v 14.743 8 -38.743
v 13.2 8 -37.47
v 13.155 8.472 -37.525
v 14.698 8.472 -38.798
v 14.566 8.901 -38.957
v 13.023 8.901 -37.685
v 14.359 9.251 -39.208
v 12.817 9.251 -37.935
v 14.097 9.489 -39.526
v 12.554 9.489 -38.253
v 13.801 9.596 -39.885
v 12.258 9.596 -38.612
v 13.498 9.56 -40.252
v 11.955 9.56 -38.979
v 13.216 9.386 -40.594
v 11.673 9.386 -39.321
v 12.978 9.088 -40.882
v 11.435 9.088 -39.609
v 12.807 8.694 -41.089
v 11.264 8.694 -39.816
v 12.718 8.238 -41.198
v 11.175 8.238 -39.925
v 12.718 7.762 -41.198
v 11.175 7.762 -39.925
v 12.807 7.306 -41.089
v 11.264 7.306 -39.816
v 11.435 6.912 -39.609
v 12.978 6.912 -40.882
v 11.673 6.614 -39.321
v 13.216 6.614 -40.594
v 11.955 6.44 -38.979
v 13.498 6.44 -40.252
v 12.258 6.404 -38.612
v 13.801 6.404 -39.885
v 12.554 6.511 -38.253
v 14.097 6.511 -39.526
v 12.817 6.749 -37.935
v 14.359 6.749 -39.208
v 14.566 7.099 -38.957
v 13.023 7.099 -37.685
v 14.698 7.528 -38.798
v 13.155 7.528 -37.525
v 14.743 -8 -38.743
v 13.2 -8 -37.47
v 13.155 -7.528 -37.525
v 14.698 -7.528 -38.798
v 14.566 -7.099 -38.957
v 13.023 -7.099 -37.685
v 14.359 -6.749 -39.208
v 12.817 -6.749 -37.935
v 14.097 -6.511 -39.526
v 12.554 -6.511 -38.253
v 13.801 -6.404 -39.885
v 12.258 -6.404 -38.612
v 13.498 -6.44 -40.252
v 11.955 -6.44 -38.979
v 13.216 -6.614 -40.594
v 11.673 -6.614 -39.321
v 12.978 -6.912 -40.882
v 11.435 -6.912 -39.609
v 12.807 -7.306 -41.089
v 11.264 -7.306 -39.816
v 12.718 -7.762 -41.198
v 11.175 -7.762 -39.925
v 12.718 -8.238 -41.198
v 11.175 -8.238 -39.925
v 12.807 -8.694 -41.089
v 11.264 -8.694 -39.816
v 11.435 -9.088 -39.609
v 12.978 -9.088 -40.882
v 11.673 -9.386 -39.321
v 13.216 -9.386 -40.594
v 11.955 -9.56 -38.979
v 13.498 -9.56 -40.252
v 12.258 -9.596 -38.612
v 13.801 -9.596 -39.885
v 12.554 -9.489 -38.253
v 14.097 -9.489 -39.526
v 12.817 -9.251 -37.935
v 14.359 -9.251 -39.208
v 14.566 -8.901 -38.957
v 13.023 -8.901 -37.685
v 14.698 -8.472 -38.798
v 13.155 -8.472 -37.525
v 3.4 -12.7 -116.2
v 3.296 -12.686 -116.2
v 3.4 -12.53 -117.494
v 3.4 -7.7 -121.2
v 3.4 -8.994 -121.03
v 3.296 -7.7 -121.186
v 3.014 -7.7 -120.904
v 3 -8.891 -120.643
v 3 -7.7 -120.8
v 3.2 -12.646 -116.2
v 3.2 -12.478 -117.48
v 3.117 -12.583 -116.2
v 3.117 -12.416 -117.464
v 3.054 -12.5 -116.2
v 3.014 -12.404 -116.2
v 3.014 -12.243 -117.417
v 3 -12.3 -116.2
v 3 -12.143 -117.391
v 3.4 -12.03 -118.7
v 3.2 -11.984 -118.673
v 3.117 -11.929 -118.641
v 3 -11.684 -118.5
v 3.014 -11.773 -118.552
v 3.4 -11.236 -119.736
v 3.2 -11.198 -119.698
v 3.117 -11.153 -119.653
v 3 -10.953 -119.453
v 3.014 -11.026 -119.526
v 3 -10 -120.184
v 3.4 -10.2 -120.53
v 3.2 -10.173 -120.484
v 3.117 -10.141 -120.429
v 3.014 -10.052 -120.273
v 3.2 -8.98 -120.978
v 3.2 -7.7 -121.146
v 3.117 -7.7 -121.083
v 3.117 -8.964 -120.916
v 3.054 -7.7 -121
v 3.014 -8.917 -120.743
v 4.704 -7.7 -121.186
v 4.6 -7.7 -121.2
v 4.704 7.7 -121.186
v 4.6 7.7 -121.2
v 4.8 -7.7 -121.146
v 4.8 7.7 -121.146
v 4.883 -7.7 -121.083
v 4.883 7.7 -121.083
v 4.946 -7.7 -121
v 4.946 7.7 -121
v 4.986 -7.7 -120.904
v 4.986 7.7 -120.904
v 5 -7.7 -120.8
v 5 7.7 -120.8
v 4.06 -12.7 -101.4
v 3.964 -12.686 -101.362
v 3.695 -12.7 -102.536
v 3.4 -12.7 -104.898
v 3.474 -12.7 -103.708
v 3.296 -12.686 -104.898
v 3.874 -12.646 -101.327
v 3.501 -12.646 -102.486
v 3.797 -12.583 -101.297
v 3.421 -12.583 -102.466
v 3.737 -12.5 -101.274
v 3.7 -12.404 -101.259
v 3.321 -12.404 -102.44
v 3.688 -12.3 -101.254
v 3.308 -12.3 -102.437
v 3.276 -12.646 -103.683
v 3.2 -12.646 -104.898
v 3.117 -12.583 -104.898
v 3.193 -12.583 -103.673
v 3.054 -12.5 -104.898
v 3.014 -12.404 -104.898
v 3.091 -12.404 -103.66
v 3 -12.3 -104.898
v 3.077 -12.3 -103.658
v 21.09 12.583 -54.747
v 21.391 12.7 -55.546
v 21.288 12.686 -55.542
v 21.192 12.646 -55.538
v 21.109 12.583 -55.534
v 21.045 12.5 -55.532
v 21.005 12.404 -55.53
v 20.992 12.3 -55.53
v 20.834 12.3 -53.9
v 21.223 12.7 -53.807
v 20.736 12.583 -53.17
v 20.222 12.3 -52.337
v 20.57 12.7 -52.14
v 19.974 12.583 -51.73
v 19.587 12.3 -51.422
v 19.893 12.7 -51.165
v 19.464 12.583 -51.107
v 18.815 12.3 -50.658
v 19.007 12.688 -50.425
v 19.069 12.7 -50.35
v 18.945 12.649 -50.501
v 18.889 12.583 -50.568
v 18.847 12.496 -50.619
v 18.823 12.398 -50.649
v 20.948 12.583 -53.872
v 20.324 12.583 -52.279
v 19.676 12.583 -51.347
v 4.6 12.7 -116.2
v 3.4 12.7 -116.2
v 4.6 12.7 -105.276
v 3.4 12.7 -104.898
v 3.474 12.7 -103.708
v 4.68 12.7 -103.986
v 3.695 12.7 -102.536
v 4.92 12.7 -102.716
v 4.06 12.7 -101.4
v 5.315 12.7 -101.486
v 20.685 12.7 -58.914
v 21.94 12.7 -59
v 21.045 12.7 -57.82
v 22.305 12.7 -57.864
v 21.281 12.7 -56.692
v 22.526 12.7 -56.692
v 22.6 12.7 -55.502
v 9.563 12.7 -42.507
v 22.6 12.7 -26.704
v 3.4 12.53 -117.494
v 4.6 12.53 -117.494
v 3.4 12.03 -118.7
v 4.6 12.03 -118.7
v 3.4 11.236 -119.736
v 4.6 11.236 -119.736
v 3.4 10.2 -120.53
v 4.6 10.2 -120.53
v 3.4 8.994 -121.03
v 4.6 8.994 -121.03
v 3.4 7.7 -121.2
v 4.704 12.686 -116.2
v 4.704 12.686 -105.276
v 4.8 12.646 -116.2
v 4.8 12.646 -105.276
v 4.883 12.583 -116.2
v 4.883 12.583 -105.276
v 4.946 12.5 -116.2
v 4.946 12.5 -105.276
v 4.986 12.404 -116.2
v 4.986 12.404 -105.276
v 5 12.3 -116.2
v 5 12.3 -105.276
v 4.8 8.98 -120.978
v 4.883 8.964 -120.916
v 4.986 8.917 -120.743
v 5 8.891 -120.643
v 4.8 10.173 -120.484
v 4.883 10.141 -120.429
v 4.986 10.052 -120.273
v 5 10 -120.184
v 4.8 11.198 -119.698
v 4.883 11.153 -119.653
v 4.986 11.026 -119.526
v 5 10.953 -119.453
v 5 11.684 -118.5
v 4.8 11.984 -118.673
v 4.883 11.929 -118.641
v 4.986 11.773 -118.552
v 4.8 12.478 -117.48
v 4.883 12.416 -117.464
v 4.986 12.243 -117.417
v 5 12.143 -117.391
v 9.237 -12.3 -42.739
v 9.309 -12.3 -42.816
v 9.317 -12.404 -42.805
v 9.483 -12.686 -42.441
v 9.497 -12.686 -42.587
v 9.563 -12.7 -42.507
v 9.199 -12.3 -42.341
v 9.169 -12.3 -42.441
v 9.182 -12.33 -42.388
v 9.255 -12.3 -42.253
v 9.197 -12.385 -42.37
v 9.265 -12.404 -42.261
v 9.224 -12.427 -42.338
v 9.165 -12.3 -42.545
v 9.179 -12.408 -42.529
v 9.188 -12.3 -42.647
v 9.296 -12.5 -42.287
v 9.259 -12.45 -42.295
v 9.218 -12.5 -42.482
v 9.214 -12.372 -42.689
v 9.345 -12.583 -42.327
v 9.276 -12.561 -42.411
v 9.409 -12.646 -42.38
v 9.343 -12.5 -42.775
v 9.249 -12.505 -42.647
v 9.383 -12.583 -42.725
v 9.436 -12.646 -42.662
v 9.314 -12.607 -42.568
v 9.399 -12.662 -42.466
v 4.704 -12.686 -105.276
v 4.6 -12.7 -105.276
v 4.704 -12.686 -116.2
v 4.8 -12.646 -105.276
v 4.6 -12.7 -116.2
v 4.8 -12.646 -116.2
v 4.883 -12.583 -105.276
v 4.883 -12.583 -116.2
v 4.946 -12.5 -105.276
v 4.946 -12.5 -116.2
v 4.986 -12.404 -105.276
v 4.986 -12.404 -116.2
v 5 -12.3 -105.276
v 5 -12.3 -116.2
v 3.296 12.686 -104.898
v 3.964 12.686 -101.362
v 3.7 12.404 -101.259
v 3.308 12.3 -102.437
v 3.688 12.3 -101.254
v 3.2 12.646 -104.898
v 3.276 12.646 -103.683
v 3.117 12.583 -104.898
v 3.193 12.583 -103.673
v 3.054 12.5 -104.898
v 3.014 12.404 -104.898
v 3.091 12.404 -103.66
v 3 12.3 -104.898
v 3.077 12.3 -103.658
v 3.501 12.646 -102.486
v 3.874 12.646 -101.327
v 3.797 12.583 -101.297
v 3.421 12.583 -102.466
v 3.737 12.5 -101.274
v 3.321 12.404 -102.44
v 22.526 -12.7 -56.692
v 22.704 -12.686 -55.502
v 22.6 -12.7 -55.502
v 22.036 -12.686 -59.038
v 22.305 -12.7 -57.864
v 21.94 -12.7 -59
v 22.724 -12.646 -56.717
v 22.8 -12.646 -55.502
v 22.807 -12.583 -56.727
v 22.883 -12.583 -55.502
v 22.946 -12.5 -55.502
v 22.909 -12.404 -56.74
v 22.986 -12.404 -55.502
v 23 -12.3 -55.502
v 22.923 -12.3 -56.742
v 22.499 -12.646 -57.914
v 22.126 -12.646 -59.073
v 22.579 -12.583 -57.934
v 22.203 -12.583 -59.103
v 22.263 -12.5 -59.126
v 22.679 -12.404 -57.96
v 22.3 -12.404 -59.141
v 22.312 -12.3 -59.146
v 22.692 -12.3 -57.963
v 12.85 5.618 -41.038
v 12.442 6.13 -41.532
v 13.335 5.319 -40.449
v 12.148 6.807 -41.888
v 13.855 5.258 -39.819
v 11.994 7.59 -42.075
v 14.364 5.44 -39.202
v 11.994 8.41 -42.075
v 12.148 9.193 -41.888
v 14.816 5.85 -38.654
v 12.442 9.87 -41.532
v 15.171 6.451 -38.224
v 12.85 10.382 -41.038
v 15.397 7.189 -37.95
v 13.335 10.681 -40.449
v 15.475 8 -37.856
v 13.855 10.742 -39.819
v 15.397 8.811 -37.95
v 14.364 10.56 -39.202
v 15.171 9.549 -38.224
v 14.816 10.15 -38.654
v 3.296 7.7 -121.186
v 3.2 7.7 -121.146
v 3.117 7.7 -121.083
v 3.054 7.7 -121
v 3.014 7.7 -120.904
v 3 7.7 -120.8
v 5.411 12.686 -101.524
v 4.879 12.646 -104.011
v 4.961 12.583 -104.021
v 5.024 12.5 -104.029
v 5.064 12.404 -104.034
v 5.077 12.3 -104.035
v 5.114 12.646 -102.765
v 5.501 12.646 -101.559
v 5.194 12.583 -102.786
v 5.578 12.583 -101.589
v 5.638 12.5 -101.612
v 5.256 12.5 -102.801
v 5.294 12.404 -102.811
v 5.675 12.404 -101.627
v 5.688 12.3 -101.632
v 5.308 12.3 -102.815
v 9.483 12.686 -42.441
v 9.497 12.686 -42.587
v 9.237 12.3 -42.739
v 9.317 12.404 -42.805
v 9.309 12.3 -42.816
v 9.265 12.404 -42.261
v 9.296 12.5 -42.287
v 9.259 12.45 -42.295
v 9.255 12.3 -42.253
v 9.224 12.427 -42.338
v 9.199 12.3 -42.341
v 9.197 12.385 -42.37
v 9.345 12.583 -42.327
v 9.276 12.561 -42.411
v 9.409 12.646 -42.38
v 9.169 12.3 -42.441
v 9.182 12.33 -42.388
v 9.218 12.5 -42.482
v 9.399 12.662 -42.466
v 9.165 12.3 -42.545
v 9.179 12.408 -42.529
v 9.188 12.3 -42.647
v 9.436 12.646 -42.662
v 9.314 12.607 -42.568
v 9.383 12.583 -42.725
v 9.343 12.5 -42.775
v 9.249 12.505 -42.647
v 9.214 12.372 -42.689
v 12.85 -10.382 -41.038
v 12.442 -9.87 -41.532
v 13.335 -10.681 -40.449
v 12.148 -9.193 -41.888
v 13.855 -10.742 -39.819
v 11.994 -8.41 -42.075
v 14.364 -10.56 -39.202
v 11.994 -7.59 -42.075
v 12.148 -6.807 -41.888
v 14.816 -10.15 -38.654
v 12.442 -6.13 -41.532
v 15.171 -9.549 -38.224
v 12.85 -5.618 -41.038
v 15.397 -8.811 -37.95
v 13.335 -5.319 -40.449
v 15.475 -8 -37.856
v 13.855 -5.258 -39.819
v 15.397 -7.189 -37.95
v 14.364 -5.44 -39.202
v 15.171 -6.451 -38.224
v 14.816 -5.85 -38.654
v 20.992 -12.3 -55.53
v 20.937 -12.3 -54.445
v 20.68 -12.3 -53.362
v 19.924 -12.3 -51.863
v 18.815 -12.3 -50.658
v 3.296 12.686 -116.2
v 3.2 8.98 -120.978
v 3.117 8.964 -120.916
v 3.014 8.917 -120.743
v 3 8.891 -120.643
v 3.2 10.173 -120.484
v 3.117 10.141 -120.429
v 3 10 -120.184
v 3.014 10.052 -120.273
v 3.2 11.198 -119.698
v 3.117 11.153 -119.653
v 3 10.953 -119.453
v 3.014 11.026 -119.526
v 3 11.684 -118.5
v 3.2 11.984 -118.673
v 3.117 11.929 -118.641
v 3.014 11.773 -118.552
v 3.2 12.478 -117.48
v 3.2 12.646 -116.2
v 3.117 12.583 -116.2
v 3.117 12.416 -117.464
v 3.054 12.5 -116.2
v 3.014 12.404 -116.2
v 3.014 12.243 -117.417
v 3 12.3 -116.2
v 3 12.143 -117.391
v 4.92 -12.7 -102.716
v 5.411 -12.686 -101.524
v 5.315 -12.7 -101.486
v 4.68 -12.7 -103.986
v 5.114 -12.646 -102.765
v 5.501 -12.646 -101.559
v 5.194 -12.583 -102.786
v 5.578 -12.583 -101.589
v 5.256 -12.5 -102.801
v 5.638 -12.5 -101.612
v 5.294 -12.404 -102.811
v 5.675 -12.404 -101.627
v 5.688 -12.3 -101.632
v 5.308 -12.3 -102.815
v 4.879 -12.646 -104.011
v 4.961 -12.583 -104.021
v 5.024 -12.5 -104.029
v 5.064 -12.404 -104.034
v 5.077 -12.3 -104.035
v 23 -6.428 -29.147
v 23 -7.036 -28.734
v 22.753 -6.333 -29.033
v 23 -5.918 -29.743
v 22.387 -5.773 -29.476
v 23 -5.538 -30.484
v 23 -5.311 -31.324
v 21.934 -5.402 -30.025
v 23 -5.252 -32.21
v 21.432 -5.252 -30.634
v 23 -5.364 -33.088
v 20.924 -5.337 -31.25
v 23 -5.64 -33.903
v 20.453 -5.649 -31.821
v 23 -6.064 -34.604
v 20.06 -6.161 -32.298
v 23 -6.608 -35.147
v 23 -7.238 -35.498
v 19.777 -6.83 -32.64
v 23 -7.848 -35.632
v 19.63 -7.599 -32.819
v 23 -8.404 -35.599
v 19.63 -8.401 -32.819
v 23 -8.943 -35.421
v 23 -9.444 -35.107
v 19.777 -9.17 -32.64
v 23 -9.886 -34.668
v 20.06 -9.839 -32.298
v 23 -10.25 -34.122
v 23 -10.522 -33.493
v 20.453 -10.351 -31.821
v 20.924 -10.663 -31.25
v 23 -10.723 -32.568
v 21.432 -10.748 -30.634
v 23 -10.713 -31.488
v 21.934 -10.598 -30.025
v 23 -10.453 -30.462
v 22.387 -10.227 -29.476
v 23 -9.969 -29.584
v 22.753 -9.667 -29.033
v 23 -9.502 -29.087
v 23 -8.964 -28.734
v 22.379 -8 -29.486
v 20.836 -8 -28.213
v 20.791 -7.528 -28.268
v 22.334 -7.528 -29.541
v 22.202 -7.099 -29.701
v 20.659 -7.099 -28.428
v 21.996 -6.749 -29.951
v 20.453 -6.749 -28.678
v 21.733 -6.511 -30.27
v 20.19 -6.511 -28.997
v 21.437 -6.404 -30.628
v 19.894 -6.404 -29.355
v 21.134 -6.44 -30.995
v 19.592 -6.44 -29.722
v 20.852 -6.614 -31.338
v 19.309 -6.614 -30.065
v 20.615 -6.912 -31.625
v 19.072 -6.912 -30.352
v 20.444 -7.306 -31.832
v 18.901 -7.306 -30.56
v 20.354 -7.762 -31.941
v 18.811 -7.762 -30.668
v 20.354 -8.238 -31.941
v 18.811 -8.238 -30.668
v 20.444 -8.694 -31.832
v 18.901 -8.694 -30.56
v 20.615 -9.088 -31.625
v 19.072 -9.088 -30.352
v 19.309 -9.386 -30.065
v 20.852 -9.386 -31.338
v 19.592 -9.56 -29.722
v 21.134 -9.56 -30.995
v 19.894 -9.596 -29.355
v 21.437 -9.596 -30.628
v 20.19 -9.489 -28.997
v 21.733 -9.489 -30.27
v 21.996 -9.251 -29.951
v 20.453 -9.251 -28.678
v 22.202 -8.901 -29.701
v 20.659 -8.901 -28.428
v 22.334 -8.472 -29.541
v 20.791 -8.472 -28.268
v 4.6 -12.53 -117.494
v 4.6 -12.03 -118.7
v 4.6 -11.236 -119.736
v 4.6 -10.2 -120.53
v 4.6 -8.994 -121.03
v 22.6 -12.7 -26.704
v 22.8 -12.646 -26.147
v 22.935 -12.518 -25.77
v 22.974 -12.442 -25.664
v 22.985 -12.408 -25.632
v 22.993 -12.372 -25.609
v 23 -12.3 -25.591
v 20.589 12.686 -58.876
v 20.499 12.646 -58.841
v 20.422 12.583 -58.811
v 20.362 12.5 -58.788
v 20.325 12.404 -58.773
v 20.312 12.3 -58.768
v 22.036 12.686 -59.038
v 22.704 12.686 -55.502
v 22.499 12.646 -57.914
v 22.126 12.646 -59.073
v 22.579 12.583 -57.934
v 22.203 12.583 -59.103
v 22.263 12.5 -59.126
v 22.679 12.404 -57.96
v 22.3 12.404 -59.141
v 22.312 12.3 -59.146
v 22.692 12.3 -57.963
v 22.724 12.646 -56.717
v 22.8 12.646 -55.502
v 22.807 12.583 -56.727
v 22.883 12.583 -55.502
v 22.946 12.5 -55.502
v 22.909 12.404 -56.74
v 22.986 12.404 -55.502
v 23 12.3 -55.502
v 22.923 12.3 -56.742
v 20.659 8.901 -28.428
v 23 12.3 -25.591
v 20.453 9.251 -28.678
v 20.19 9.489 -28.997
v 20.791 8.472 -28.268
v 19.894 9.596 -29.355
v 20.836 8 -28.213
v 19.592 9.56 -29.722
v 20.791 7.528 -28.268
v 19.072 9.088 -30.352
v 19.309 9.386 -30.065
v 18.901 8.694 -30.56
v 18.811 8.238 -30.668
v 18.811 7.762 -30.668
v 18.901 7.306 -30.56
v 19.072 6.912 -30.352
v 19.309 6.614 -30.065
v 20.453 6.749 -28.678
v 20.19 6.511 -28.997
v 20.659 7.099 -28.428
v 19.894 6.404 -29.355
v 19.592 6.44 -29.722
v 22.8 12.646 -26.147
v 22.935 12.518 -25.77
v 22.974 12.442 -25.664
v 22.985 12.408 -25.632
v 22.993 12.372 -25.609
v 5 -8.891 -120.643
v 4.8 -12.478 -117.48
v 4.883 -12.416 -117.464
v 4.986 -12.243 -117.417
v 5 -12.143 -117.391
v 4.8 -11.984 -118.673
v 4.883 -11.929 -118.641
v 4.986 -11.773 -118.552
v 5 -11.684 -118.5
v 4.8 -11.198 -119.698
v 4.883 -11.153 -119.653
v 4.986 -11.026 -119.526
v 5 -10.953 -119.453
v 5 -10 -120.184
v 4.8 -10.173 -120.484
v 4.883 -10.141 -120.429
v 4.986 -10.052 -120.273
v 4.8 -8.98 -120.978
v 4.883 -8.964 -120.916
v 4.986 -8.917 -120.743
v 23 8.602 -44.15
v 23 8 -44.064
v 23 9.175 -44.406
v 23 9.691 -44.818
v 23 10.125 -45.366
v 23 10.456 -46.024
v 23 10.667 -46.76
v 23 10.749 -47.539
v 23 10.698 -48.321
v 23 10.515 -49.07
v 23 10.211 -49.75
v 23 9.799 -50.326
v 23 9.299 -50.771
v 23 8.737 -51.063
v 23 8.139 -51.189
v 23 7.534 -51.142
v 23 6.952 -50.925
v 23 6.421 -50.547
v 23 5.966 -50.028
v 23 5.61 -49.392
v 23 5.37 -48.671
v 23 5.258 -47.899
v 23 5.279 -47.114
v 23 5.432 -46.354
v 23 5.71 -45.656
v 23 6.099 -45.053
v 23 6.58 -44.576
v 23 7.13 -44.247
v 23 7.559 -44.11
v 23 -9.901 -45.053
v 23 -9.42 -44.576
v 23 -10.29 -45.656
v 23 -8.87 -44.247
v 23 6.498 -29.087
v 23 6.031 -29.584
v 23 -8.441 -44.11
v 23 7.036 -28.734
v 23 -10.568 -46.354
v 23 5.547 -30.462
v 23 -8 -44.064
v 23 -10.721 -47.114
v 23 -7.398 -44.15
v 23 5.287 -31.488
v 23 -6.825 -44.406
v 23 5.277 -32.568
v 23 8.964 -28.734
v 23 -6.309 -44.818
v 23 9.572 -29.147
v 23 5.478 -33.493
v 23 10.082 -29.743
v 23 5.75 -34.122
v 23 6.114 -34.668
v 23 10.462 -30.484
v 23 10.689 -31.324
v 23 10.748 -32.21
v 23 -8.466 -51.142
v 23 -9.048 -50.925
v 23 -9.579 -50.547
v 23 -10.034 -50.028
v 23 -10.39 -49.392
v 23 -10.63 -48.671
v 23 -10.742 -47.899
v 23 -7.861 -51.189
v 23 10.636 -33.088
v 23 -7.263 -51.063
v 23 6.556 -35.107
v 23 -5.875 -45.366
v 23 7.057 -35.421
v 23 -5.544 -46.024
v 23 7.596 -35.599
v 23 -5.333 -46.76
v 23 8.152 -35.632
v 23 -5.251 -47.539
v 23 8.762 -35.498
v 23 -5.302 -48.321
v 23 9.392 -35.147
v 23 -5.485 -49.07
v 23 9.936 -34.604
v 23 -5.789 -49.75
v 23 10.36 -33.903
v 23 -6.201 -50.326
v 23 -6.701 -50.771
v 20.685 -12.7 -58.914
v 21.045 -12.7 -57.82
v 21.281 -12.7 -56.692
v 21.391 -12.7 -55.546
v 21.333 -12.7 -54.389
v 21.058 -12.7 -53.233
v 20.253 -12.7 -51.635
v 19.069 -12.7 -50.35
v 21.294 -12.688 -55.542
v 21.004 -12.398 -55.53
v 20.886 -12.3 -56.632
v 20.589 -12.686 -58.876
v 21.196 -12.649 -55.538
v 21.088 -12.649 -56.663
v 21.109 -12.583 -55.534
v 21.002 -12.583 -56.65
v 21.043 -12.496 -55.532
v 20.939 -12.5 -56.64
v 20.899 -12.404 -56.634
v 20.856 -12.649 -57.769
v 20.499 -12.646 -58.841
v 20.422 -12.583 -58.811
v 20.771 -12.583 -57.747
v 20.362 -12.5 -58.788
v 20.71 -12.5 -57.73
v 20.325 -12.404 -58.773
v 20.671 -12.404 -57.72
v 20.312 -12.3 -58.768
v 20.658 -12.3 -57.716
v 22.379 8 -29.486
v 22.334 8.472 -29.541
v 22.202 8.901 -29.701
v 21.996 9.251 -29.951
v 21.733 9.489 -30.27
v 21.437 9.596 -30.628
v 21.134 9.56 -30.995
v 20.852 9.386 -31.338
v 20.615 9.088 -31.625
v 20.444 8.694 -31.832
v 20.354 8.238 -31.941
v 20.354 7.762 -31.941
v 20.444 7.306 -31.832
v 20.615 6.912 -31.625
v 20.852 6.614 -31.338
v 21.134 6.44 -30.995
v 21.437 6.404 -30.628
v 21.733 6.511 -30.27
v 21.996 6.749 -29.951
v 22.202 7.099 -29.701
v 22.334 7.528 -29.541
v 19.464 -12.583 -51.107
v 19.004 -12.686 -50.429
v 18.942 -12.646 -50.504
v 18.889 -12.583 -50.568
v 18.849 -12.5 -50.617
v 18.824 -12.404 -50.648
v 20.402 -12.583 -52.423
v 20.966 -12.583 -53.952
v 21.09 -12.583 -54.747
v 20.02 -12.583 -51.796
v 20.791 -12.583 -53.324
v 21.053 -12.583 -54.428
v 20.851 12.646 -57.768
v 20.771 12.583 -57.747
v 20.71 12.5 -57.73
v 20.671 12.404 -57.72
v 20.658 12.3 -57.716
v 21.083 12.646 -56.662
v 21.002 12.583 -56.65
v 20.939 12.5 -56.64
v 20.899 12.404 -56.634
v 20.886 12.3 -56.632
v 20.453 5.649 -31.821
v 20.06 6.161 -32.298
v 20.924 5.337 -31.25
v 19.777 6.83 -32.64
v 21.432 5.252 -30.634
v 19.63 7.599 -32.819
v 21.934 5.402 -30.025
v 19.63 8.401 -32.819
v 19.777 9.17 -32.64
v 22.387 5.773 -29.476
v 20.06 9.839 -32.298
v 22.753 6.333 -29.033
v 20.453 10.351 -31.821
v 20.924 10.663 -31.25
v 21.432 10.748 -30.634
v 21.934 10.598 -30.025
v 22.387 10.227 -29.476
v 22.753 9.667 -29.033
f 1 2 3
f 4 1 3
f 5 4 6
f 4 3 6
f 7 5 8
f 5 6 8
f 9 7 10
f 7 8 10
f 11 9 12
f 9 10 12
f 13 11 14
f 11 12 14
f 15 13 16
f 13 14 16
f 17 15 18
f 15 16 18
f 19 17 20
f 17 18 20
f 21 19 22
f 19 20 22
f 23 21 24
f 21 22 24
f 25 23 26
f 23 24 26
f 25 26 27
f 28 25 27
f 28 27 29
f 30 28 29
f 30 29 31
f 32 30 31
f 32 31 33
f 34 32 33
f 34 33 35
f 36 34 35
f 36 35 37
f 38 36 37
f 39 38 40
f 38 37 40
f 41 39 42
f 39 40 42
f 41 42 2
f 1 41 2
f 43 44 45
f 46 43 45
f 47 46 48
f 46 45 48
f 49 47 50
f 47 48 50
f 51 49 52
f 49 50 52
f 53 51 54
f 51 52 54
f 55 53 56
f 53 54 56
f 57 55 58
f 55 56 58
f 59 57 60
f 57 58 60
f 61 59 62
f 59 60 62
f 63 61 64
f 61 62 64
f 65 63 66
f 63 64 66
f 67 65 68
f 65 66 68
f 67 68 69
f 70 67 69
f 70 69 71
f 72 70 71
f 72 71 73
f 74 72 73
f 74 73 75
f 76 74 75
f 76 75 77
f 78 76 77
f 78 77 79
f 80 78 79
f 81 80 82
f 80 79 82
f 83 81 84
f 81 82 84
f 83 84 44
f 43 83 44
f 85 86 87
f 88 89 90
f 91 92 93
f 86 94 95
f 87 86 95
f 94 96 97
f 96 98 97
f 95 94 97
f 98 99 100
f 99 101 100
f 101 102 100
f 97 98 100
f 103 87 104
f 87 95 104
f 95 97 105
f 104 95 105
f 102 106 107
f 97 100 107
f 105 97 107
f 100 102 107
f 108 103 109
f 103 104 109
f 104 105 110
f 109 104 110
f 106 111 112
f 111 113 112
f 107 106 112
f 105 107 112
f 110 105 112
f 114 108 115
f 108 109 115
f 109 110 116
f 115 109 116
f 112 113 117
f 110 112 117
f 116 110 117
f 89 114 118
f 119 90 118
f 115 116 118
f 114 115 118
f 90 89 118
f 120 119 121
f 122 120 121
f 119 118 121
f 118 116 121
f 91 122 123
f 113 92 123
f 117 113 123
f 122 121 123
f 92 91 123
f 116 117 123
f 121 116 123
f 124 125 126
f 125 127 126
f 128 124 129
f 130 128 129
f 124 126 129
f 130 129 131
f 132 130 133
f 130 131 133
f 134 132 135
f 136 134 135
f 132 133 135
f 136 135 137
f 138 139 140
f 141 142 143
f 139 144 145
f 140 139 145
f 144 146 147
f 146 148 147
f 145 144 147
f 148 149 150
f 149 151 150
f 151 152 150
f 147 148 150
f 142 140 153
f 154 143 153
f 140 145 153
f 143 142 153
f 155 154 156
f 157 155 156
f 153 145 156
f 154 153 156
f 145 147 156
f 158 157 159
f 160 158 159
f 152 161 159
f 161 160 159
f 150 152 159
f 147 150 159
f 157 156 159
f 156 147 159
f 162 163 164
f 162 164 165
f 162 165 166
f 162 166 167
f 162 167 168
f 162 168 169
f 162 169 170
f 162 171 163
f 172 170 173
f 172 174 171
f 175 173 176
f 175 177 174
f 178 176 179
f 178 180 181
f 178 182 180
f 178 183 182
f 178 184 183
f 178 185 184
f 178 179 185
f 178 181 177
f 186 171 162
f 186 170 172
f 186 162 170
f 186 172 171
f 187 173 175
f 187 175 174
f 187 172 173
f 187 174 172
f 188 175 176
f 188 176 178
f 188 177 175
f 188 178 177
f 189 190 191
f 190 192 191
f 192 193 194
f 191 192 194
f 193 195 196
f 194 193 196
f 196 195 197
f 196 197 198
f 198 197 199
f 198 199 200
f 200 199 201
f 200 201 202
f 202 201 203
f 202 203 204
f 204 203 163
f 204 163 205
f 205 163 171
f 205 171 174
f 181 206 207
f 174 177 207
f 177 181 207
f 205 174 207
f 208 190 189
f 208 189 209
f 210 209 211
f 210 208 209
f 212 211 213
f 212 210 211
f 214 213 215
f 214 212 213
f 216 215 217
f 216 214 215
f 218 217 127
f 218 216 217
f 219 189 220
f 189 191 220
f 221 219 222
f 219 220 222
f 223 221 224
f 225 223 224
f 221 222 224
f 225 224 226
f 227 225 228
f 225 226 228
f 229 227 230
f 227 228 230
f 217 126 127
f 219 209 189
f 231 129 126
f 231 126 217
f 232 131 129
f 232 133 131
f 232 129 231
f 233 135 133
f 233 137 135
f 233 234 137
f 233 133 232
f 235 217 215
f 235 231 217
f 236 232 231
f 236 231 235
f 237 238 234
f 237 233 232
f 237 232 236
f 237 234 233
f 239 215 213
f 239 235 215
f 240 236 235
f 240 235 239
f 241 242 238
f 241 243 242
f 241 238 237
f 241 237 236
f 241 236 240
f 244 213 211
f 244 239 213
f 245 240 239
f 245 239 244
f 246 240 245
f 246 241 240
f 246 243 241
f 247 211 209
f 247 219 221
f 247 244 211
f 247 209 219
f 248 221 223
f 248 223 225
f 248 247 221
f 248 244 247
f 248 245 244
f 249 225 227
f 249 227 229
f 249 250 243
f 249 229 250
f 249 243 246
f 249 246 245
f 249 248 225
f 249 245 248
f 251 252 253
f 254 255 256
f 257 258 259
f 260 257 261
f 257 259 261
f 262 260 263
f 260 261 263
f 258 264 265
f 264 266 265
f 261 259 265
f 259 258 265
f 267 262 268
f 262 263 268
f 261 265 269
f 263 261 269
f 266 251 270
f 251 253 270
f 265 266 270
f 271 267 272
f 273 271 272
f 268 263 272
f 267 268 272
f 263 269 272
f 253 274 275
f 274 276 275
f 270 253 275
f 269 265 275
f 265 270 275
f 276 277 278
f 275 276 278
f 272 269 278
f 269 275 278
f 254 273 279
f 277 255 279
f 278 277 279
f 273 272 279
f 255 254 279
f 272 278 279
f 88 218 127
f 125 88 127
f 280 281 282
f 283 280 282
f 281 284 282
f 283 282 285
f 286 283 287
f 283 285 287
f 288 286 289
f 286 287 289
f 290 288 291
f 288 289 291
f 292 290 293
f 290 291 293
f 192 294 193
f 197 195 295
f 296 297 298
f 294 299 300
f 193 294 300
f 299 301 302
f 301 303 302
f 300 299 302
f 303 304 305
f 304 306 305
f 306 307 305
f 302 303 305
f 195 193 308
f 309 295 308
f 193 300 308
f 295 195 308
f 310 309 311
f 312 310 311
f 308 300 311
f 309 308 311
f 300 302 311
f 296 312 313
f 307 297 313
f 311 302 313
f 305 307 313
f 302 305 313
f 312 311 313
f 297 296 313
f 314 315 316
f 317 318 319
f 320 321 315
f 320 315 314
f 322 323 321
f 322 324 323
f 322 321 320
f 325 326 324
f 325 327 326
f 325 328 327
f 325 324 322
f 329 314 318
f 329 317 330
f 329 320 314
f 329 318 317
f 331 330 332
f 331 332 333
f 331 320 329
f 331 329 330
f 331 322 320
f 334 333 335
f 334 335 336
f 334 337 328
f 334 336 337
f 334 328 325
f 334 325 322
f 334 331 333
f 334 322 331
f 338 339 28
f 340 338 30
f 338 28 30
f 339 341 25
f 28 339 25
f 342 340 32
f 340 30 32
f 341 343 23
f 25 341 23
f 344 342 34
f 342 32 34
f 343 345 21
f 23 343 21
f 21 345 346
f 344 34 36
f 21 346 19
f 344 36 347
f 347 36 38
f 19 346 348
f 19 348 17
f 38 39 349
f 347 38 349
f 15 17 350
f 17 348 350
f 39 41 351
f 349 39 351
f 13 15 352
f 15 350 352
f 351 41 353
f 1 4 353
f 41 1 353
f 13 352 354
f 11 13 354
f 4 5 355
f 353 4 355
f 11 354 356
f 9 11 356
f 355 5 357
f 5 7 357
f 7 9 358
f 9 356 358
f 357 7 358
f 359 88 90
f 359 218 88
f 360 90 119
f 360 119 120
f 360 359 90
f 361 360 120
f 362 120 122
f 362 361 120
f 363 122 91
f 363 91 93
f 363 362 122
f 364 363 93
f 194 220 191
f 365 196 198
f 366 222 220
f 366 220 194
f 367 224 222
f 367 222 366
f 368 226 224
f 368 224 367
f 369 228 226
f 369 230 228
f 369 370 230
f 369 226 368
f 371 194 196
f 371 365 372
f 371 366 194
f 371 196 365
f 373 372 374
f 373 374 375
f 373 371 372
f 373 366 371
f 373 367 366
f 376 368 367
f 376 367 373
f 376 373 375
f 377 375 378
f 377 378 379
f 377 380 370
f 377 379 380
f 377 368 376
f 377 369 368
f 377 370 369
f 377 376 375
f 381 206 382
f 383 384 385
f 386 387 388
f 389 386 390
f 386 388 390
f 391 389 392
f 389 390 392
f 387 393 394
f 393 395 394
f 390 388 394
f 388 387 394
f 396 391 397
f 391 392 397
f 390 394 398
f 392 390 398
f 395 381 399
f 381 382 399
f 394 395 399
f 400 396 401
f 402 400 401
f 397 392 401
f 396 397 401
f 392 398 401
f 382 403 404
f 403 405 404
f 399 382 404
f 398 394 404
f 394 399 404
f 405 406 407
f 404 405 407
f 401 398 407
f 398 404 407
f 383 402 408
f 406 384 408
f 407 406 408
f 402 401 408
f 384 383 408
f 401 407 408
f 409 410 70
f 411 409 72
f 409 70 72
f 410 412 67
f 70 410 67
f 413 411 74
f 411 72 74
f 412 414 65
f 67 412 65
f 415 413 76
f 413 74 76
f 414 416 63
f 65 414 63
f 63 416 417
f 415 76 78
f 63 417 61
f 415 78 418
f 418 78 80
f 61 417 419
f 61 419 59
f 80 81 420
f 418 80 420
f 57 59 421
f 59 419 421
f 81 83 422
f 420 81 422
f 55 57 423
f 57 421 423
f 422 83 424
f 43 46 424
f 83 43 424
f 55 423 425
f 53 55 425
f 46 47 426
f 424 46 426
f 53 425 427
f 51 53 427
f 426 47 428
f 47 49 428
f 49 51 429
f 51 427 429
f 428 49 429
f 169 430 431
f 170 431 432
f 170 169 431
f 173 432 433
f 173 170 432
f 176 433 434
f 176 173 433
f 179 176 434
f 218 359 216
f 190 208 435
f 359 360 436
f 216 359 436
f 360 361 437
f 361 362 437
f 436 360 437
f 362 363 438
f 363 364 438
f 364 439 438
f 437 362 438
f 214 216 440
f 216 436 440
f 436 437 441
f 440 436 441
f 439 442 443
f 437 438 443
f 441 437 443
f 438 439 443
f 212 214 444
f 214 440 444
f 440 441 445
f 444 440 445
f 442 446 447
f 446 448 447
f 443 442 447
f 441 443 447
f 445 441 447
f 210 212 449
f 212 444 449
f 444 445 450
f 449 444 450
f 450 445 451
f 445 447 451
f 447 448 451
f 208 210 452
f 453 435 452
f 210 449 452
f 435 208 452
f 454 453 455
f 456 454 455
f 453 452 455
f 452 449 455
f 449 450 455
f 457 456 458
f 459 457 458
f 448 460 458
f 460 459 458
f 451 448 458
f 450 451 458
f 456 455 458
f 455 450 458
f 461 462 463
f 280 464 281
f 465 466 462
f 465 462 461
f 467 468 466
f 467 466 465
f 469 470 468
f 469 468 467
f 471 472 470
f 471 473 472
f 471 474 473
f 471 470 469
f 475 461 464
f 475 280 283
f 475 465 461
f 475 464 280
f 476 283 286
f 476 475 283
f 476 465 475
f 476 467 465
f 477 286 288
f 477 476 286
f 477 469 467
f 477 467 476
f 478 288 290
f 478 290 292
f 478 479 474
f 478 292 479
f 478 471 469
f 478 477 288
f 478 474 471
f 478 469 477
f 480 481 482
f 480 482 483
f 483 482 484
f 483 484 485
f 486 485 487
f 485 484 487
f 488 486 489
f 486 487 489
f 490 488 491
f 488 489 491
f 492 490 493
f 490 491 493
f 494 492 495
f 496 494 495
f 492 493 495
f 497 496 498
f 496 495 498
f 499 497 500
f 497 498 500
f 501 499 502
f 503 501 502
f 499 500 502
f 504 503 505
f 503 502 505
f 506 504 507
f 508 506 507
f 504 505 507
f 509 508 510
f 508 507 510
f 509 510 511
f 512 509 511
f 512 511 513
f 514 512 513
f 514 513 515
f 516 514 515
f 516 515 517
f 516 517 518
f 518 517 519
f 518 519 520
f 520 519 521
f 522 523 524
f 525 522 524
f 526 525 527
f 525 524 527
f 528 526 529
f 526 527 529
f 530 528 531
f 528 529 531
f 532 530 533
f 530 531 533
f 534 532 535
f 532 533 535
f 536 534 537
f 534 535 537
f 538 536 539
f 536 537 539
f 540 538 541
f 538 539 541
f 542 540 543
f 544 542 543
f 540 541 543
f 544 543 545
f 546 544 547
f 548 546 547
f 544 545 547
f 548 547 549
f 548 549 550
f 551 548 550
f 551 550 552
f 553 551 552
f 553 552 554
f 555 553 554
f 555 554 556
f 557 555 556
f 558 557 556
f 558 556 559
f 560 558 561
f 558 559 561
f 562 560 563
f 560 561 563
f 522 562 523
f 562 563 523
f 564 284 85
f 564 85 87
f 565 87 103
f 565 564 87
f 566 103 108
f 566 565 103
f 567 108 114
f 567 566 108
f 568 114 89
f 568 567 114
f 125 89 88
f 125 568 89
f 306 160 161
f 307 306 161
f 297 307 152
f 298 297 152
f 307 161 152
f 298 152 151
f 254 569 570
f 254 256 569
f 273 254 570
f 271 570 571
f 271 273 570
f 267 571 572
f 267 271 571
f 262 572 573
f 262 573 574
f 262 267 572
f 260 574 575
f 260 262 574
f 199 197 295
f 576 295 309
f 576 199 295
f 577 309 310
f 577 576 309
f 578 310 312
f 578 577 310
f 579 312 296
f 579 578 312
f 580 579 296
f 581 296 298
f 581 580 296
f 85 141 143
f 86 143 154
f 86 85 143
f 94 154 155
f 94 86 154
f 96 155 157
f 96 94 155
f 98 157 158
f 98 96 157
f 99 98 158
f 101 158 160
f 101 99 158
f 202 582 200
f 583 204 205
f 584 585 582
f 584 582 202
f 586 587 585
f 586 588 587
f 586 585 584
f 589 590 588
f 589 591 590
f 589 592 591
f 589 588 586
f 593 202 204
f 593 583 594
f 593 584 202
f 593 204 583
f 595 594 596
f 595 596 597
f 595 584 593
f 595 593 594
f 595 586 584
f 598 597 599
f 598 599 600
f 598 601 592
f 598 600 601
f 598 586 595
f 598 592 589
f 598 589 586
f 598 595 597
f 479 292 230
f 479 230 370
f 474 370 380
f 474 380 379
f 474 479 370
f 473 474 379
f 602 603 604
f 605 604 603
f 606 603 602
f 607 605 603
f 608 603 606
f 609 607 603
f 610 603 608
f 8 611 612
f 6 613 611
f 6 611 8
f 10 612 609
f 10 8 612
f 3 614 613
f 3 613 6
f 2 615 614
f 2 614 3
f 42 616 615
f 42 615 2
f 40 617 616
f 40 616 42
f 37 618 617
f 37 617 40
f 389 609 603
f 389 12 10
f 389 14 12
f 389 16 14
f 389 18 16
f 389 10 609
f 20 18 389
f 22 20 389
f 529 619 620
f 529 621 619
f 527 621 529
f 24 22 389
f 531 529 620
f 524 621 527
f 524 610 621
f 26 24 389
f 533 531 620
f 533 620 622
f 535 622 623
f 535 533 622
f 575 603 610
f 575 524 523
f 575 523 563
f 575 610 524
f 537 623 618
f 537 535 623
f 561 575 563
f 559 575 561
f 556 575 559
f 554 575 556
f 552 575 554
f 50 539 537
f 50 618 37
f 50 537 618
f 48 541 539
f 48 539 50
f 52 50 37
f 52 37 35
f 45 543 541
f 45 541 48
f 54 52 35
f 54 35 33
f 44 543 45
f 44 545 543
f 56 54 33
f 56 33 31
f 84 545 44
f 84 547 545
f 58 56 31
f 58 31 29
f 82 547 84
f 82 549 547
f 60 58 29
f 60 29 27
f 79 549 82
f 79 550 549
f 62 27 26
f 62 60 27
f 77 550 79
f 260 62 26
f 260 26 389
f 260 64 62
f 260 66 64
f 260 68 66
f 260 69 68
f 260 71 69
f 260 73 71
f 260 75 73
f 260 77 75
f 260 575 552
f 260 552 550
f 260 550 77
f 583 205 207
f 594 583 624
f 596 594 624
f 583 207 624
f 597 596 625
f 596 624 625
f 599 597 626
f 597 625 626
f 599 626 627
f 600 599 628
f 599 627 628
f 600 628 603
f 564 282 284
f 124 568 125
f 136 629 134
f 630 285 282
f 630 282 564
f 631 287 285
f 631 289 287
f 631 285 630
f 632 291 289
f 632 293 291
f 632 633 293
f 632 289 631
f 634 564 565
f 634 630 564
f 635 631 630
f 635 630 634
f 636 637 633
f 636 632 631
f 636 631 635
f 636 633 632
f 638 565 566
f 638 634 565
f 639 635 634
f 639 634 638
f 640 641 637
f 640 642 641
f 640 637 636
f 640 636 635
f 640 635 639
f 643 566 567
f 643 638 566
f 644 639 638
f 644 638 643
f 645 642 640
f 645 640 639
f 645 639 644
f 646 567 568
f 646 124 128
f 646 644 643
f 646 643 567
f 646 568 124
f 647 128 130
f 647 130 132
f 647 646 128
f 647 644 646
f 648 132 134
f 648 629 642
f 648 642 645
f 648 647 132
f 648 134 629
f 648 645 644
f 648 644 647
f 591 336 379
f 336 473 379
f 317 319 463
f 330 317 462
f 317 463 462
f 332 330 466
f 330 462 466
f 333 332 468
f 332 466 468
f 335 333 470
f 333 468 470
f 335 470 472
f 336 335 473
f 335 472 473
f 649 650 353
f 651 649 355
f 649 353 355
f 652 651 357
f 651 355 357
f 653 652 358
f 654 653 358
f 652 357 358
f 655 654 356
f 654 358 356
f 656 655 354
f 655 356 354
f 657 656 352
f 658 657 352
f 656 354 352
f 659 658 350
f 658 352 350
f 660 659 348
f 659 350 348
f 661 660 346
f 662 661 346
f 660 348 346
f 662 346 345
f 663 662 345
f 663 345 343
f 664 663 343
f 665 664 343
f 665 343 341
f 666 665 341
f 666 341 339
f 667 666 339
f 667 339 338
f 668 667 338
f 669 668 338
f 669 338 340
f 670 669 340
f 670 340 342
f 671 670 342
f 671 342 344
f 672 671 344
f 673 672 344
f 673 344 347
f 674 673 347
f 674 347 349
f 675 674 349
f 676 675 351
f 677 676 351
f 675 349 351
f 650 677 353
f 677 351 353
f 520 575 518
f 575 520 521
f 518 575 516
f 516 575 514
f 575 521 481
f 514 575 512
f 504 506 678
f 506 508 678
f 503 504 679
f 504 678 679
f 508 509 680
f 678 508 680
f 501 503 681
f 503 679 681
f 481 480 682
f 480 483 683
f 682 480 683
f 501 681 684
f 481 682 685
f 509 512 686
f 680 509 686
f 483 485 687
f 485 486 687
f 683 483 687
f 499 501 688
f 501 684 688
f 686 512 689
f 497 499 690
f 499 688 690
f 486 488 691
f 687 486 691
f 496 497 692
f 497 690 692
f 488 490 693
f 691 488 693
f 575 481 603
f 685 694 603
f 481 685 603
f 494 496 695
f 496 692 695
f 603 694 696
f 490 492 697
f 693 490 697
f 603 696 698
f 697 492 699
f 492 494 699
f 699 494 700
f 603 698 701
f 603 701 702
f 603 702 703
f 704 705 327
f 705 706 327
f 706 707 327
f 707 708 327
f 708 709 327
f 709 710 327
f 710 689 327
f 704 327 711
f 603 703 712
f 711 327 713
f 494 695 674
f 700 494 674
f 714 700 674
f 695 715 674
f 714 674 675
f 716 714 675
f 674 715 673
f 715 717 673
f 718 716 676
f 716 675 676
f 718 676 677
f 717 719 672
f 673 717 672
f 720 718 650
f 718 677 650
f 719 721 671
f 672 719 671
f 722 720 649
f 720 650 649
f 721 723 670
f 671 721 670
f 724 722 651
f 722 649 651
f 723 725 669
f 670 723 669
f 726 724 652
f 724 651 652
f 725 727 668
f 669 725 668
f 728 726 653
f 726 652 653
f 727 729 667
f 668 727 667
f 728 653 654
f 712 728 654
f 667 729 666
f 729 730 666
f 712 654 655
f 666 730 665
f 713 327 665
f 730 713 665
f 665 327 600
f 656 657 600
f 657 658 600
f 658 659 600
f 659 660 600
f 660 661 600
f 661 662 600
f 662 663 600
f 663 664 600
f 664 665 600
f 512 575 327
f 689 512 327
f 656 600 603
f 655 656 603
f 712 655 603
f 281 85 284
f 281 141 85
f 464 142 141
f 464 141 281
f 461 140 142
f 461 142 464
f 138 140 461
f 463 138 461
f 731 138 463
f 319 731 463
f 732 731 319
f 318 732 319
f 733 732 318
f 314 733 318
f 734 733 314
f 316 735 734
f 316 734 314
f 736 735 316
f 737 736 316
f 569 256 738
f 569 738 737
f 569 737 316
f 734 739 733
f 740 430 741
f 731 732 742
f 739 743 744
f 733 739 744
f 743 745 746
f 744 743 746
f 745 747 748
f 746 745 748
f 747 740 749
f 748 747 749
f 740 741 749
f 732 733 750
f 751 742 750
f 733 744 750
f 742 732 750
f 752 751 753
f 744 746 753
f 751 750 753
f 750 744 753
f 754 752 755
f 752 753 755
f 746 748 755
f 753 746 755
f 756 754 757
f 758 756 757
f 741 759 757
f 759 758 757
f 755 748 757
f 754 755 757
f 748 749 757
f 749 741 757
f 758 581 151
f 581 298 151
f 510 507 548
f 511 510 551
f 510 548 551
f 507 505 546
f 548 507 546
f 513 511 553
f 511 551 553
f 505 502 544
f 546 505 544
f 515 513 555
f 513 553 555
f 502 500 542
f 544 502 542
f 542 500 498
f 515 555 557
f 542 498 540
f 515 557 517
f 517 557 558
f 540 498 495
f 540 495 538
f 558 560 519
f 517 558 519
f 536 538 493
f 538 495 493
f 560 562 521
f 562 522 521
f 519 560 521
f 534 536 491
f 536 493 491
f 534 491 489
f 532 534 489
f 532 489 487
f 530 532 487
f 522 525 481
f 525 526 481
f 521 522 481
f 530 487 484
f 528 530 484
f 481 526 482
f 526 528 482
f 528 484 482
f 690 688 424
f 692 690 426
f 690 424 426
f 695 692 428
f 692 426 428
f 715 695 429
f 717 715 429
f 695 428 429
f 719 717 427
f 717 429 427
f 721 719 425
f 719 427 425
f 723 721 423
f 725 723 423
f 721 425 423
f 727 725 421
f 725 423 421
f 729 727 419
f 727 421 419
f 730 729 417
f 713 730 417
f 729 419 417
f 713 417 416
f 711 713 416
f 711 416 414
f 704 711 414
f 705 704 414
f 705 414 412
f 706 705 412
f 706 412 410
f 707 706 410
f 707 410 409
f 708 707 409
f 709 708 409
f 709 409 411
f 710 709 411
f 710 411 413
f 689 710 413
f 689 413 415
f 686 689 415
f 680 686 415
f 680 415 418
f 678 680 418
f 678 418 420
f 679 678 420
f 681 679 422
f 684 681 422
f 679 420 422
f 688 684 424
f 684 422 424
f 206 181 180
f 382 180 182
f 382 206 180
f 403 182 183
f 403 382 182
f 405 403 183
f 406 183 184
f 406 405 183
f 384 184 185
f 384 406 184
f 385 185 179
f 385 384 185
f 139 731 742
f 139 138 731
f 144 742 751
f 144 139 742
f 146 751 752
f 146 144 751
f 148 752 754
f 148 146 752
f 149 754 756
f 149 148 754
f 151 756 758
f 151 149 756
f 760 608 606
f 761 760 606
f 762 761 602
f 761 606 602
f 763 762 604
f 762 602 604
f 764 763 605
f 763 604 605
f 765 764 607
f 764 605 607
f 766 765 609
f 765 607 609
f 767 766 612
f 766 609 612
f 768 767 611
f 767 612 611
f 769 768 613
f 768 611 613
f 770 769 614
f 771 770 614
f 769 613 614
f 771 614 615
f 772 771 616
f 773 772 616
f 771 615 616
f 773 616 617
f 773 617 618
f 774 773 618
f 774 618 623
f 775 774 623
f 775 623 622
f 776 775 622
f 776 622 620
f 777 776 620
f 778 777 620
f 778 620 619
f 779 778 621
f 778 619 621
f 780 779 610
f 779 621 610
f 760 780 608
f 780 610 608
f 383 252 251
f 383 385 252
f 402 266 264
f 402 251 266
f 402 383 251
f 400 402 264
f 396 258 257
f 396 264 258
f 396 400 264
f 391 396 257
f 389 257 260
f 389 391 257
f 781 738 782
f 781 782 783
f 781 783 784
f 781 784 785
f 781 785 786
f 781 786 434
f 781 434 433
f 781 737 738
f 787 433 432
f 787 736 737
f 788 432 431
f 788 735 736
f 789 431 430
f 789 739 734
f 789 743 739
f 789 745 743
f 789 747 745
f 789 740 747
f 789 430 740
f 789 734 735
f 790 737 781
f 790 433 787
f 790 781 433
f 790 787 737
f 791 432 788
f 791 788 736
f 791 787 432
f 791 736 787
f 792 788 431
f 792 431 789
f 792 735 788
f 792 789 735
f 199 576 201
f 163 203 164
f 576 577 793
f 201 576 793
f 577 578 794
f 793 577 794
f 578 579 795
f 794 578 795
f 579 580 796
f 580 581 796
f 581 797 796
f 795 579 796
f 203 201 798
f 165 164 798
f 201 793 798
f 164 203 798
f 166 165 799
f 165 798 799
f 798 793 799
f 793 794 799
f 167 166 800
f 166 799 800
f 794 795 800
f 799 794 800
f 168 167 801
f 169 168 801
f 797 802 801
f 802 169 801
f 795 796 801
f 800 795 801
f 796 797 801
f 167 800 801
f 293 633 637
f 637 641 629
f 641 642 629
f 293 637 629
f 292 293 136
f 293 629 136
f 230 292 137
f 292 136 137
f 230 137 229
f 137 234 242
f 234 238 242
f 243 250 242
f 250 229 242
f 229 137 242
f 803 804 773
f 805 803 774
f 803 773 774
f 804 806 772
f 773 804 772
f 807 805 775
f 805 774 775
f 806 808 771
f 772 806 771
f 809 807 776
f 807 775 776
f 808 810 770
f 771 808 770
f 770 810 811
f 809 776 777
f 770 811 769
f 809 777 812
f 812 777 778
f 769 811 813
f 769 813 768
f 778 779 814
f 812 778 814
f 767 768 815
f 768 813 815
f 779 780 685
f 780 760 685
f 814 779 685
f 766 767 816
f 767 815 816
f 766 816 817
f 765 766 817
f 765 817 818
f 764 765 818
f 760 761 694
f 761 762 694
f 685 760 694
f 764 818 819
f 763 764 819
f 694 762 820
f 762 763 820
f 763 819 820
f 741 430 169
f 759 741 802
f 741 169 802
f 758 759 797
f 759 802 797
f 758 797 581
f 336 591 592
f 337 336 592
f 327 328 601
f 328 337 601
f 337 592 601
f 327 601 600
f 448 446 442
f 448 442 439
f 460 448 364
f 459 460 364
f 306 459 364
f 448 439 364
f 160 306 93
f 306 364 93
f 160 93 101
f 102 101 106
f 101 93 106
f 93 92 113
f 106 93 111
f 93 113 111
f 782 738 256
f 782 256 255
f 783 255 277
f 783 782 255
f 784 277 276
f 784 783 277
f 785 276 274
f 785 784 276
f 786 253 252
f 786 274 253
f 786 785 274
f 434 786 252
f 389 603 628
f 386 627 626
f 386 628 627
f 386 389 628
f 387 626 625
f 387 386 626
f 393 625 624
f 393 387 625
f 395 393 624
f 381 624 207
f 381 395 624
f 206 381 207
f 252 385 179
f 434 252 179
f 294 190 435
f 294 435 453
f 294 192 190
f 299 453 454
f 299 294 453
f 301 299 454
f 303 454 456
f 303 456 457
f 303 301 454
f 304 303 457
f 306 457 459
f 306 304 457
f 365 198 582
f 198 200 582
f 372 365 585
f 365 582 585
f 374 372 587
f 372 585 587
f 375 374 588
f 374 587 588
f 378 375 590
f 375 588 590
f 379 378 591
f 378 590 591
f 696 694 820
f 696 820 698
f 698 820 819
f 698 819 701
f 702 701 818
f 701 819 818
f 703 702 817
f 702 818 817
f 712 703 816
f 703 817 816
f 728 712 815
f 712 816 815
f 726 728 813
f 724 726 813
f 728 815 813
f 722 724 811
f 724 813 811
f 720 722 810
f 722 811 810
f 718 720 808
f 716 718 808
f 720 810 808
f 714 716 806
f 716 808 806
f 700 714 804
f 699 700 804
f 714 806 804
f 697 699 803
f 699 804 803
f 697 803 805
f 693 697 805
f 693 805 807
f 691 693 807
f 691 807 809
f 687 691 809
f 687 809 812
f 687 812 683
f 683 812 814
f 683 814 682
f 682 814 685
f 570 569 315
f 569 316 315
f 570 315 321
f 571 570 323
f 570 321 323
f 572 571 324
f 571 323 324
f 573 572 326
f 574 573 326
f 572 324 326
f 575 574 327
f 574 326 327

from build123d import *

# Parameters (mm, degrees)
SKETCH1_W           = 2
SKETCH1_H           = 25.4
SKETCH4_W           = 5
SKETCH4_H           = 25.4
CUT_EXTRUDE2_DEPTH  = 21
BOSS_EXTRUDE2_DEPTH = 25.4
BOSS_EXTRUDE4_DEPTH = 25.4
FILLET1_R           = 5
CUT_EXTRUDE3_DEPTH  = 26.4
SKETCH9_R           = 1.6
CUT_EXTRUDE4_DEPTH  = 2
SKETCH10_R          = 2.75
CUT_EXTRUDE5_DEPTH  = 59.842249491
FILLET2_R           = 10
FILLET5_R           = 6
FILLET3_R           = 0.4


with BuildPart() as part:
    # Sweep1: sweep along a path in Sketch2
    with BuildLine(Plane(origin=(0, 0, 0), x_dir=(1, 0, 0), z_dir=(0, 1, 0))) as sweep1_path:
        Line((22, 0), (22, 57.2))
        Line((22, 57.2), (4, 103.2))
        Line((4, 103.2), (4, 121.2))
    # Sketch1 → Sweep1 (sweep)
    with BuildSketch(Plane.XY):
        with Locations((22, 0)):
            Rectangle(SKETCH1_W, SKETCH1_H)
    sweep(path=sweep1_path.line, transition=Transition.RIGHT)

    # Sketch4 → Cut-Extrude2 (cut, through all)
    with BuildSketch(Plane(origin=(23, 0, 0), x_dir=(0, 0, -1), z_dir=(1, 0, 0))):
        with Locations((2.5, 0)):
            Rectangle(SKETCH4_W, SKETCH4_H)
    extrude(amount=-CUT_EXTRUDE2_DEPTH, mode=Mode.SUBTRACT)

    # Sketch5 → Boss-Extrude2 (add, through all)
    with BuildSketch(Plane.XZ.offset(12.7)):
        Polygon((21, -42.561313548), (21, -28.015116906), (9, -42.561313548), align=None)
    extrude(amount=-BOSS_EXTRUDE2_DEPTH)

    # Sketch6 → Boss-Extrude4 (add, through all)
    with BuildSketch(Plane.XZ.offset(12.7)):
        Polygon((9, -42.561313548), (21, -52.460808484), (21, -42.561313548), align=None)
    extrude(amount=-BOSS_EXTRUDE4_DEPTH)

    # Fillet1
    fillet1_edges = [part.edges().sort_by_distance(p)[0] for p in [
        (4, -12.7, -121.2),
        (4, 12.7, -121.2),
    ]]
    fillet(fillet1_edges, radius=FILLET1_R)

    # Sketch8 → Cut-Extrude3 (cut, through all)
    with BuildSketch(Plane.XZ.offset(12.7)):
        Polygon((23, -25.590750799), (23, -5), (21, -5), (21, -28.015116906), align=None)
    extrude(amount=-CUT_EXTRUDE3_DEPTH, mode=Mode.SUBTRACT)

    # Sketch9 → Cut-Extrude4 (cut)
    with BuildSketch(Plane(origin=(26.248041717, 0, -21.653529673), x_dir=(0.636363636, 0, 0.771389216), z_dir=(-0.771389216, 0, 0.636363636))):
        with Locations((-22.104065555, 8)):
            Circle(SKETCH9_R)
        with Locations((-22.104065555, -8)):
            Circle(SKETCH9_R)
        with Locations((-10.104065555, -8)):
            Circle(SKETCH9_R)
        with Locations((-10.104065555, 8)):
            Circle(SKETCH9_R)
    extrude(amount=-CUT_EXTRUDE4_DEPTH, mode=Mode.SUBTRACT)

    # Sketch10 → Cut-Extrude5 (cut, through all)
    with BuildSketch(Plane(origin=(27.790820149, 0, -22.926256946), x_dir=(0.636363636, 0, 0.771389216), z_dir=(-0.771389216, 0, 0.636363636))):
        with Locations((-22.104065555, 8)):
            Circle(SKETCH10_R)
        with Locations((-10.104065555, 8)):
            Circle(SKETCH10_R)
        with Locations((-10.104065555, -8)):
            Circle(SKETCH10_R)
        with Locations((-22.104065555, -8)):
            Circle(SKETCH10_R)
    extrude(amount=-CUT_EXTRUDE5_DEPTH, mode=Mode.SUBTRACT)

    # Fillet2
    fillet2_edges = [part.edges().sort_by_distance(p)[0] for p in [
        (23, 0, -57.388686452),
        (21, 0, -57.011313548),
        (3, 0, -103.011313548),
        (5, 0, -103.388686452),
    ]]
    fillet(fillet2_edges, radius=FILLET2_R)

    # Fillet5
    fillet5_edges = [part.edges().sort_by_distance(p)[0] for p in [
        (21, 0, -52.460808484),
    ]]
    fillet(fillet5_edges, radius=FILLET5_R)

    # Fillet3
    fillet3_edges = [part.edges().sort_by_distance(p)[0] for p in [
        (5, -12.7, -110.737775488),
        (5, 12.7, -110.737775488),
        (14, 12.7, -80.388686452),
        (14, -12.7, -80.388686452),
        (3, -12.7, -110.549089035),
        (3, 12.7, -110.549089035),
        (23, 12.7, -40.546286364),
        (12, 12.7, -80.011313548),
        (22.826603634, 12.7, -57.355968907),
        (3.173396366, 12.7, -103.044031093),
        (12, -12.7, -80.011313548),
        (23, -12.7, -40.546286364),
        (22.826603634, -12.7, -57.355968907),
        (3.173396366, -12.7, -103.044031093),
        (5.173396366, -12.7, -103.421403997),
        (5.173396366, 12.7, -103.421403997),
        (20.787013978, 12.7, -57.177339033),
        (20.787013978, -12.7, -57.177339033),
        (20.474647805, -12.7, -52.838617841),
        (20.474647805, 12.7, -52.838617841),
        (16, 12.7, -34.076032173),
        (9, 0, -42.561313548),
        (16, -12.7, -34.076032173),
        (13.907448432, 12.7, -46.609751957),
        (13.907448432, -12.7, -46.609751957),
        (5, 0, -121.2),
        (5, 11.235533906, -119.735533906),
        (5, -11.235533906, -119.735533906),
        (3, 0, -121.2),
        (3, 11.235533906, -119.735533906),
        (3, -11.235533906, -119.735533906),
    ]]
    fillet(fillet3_edges, radius=FILLET3_R)


solid = part.part
